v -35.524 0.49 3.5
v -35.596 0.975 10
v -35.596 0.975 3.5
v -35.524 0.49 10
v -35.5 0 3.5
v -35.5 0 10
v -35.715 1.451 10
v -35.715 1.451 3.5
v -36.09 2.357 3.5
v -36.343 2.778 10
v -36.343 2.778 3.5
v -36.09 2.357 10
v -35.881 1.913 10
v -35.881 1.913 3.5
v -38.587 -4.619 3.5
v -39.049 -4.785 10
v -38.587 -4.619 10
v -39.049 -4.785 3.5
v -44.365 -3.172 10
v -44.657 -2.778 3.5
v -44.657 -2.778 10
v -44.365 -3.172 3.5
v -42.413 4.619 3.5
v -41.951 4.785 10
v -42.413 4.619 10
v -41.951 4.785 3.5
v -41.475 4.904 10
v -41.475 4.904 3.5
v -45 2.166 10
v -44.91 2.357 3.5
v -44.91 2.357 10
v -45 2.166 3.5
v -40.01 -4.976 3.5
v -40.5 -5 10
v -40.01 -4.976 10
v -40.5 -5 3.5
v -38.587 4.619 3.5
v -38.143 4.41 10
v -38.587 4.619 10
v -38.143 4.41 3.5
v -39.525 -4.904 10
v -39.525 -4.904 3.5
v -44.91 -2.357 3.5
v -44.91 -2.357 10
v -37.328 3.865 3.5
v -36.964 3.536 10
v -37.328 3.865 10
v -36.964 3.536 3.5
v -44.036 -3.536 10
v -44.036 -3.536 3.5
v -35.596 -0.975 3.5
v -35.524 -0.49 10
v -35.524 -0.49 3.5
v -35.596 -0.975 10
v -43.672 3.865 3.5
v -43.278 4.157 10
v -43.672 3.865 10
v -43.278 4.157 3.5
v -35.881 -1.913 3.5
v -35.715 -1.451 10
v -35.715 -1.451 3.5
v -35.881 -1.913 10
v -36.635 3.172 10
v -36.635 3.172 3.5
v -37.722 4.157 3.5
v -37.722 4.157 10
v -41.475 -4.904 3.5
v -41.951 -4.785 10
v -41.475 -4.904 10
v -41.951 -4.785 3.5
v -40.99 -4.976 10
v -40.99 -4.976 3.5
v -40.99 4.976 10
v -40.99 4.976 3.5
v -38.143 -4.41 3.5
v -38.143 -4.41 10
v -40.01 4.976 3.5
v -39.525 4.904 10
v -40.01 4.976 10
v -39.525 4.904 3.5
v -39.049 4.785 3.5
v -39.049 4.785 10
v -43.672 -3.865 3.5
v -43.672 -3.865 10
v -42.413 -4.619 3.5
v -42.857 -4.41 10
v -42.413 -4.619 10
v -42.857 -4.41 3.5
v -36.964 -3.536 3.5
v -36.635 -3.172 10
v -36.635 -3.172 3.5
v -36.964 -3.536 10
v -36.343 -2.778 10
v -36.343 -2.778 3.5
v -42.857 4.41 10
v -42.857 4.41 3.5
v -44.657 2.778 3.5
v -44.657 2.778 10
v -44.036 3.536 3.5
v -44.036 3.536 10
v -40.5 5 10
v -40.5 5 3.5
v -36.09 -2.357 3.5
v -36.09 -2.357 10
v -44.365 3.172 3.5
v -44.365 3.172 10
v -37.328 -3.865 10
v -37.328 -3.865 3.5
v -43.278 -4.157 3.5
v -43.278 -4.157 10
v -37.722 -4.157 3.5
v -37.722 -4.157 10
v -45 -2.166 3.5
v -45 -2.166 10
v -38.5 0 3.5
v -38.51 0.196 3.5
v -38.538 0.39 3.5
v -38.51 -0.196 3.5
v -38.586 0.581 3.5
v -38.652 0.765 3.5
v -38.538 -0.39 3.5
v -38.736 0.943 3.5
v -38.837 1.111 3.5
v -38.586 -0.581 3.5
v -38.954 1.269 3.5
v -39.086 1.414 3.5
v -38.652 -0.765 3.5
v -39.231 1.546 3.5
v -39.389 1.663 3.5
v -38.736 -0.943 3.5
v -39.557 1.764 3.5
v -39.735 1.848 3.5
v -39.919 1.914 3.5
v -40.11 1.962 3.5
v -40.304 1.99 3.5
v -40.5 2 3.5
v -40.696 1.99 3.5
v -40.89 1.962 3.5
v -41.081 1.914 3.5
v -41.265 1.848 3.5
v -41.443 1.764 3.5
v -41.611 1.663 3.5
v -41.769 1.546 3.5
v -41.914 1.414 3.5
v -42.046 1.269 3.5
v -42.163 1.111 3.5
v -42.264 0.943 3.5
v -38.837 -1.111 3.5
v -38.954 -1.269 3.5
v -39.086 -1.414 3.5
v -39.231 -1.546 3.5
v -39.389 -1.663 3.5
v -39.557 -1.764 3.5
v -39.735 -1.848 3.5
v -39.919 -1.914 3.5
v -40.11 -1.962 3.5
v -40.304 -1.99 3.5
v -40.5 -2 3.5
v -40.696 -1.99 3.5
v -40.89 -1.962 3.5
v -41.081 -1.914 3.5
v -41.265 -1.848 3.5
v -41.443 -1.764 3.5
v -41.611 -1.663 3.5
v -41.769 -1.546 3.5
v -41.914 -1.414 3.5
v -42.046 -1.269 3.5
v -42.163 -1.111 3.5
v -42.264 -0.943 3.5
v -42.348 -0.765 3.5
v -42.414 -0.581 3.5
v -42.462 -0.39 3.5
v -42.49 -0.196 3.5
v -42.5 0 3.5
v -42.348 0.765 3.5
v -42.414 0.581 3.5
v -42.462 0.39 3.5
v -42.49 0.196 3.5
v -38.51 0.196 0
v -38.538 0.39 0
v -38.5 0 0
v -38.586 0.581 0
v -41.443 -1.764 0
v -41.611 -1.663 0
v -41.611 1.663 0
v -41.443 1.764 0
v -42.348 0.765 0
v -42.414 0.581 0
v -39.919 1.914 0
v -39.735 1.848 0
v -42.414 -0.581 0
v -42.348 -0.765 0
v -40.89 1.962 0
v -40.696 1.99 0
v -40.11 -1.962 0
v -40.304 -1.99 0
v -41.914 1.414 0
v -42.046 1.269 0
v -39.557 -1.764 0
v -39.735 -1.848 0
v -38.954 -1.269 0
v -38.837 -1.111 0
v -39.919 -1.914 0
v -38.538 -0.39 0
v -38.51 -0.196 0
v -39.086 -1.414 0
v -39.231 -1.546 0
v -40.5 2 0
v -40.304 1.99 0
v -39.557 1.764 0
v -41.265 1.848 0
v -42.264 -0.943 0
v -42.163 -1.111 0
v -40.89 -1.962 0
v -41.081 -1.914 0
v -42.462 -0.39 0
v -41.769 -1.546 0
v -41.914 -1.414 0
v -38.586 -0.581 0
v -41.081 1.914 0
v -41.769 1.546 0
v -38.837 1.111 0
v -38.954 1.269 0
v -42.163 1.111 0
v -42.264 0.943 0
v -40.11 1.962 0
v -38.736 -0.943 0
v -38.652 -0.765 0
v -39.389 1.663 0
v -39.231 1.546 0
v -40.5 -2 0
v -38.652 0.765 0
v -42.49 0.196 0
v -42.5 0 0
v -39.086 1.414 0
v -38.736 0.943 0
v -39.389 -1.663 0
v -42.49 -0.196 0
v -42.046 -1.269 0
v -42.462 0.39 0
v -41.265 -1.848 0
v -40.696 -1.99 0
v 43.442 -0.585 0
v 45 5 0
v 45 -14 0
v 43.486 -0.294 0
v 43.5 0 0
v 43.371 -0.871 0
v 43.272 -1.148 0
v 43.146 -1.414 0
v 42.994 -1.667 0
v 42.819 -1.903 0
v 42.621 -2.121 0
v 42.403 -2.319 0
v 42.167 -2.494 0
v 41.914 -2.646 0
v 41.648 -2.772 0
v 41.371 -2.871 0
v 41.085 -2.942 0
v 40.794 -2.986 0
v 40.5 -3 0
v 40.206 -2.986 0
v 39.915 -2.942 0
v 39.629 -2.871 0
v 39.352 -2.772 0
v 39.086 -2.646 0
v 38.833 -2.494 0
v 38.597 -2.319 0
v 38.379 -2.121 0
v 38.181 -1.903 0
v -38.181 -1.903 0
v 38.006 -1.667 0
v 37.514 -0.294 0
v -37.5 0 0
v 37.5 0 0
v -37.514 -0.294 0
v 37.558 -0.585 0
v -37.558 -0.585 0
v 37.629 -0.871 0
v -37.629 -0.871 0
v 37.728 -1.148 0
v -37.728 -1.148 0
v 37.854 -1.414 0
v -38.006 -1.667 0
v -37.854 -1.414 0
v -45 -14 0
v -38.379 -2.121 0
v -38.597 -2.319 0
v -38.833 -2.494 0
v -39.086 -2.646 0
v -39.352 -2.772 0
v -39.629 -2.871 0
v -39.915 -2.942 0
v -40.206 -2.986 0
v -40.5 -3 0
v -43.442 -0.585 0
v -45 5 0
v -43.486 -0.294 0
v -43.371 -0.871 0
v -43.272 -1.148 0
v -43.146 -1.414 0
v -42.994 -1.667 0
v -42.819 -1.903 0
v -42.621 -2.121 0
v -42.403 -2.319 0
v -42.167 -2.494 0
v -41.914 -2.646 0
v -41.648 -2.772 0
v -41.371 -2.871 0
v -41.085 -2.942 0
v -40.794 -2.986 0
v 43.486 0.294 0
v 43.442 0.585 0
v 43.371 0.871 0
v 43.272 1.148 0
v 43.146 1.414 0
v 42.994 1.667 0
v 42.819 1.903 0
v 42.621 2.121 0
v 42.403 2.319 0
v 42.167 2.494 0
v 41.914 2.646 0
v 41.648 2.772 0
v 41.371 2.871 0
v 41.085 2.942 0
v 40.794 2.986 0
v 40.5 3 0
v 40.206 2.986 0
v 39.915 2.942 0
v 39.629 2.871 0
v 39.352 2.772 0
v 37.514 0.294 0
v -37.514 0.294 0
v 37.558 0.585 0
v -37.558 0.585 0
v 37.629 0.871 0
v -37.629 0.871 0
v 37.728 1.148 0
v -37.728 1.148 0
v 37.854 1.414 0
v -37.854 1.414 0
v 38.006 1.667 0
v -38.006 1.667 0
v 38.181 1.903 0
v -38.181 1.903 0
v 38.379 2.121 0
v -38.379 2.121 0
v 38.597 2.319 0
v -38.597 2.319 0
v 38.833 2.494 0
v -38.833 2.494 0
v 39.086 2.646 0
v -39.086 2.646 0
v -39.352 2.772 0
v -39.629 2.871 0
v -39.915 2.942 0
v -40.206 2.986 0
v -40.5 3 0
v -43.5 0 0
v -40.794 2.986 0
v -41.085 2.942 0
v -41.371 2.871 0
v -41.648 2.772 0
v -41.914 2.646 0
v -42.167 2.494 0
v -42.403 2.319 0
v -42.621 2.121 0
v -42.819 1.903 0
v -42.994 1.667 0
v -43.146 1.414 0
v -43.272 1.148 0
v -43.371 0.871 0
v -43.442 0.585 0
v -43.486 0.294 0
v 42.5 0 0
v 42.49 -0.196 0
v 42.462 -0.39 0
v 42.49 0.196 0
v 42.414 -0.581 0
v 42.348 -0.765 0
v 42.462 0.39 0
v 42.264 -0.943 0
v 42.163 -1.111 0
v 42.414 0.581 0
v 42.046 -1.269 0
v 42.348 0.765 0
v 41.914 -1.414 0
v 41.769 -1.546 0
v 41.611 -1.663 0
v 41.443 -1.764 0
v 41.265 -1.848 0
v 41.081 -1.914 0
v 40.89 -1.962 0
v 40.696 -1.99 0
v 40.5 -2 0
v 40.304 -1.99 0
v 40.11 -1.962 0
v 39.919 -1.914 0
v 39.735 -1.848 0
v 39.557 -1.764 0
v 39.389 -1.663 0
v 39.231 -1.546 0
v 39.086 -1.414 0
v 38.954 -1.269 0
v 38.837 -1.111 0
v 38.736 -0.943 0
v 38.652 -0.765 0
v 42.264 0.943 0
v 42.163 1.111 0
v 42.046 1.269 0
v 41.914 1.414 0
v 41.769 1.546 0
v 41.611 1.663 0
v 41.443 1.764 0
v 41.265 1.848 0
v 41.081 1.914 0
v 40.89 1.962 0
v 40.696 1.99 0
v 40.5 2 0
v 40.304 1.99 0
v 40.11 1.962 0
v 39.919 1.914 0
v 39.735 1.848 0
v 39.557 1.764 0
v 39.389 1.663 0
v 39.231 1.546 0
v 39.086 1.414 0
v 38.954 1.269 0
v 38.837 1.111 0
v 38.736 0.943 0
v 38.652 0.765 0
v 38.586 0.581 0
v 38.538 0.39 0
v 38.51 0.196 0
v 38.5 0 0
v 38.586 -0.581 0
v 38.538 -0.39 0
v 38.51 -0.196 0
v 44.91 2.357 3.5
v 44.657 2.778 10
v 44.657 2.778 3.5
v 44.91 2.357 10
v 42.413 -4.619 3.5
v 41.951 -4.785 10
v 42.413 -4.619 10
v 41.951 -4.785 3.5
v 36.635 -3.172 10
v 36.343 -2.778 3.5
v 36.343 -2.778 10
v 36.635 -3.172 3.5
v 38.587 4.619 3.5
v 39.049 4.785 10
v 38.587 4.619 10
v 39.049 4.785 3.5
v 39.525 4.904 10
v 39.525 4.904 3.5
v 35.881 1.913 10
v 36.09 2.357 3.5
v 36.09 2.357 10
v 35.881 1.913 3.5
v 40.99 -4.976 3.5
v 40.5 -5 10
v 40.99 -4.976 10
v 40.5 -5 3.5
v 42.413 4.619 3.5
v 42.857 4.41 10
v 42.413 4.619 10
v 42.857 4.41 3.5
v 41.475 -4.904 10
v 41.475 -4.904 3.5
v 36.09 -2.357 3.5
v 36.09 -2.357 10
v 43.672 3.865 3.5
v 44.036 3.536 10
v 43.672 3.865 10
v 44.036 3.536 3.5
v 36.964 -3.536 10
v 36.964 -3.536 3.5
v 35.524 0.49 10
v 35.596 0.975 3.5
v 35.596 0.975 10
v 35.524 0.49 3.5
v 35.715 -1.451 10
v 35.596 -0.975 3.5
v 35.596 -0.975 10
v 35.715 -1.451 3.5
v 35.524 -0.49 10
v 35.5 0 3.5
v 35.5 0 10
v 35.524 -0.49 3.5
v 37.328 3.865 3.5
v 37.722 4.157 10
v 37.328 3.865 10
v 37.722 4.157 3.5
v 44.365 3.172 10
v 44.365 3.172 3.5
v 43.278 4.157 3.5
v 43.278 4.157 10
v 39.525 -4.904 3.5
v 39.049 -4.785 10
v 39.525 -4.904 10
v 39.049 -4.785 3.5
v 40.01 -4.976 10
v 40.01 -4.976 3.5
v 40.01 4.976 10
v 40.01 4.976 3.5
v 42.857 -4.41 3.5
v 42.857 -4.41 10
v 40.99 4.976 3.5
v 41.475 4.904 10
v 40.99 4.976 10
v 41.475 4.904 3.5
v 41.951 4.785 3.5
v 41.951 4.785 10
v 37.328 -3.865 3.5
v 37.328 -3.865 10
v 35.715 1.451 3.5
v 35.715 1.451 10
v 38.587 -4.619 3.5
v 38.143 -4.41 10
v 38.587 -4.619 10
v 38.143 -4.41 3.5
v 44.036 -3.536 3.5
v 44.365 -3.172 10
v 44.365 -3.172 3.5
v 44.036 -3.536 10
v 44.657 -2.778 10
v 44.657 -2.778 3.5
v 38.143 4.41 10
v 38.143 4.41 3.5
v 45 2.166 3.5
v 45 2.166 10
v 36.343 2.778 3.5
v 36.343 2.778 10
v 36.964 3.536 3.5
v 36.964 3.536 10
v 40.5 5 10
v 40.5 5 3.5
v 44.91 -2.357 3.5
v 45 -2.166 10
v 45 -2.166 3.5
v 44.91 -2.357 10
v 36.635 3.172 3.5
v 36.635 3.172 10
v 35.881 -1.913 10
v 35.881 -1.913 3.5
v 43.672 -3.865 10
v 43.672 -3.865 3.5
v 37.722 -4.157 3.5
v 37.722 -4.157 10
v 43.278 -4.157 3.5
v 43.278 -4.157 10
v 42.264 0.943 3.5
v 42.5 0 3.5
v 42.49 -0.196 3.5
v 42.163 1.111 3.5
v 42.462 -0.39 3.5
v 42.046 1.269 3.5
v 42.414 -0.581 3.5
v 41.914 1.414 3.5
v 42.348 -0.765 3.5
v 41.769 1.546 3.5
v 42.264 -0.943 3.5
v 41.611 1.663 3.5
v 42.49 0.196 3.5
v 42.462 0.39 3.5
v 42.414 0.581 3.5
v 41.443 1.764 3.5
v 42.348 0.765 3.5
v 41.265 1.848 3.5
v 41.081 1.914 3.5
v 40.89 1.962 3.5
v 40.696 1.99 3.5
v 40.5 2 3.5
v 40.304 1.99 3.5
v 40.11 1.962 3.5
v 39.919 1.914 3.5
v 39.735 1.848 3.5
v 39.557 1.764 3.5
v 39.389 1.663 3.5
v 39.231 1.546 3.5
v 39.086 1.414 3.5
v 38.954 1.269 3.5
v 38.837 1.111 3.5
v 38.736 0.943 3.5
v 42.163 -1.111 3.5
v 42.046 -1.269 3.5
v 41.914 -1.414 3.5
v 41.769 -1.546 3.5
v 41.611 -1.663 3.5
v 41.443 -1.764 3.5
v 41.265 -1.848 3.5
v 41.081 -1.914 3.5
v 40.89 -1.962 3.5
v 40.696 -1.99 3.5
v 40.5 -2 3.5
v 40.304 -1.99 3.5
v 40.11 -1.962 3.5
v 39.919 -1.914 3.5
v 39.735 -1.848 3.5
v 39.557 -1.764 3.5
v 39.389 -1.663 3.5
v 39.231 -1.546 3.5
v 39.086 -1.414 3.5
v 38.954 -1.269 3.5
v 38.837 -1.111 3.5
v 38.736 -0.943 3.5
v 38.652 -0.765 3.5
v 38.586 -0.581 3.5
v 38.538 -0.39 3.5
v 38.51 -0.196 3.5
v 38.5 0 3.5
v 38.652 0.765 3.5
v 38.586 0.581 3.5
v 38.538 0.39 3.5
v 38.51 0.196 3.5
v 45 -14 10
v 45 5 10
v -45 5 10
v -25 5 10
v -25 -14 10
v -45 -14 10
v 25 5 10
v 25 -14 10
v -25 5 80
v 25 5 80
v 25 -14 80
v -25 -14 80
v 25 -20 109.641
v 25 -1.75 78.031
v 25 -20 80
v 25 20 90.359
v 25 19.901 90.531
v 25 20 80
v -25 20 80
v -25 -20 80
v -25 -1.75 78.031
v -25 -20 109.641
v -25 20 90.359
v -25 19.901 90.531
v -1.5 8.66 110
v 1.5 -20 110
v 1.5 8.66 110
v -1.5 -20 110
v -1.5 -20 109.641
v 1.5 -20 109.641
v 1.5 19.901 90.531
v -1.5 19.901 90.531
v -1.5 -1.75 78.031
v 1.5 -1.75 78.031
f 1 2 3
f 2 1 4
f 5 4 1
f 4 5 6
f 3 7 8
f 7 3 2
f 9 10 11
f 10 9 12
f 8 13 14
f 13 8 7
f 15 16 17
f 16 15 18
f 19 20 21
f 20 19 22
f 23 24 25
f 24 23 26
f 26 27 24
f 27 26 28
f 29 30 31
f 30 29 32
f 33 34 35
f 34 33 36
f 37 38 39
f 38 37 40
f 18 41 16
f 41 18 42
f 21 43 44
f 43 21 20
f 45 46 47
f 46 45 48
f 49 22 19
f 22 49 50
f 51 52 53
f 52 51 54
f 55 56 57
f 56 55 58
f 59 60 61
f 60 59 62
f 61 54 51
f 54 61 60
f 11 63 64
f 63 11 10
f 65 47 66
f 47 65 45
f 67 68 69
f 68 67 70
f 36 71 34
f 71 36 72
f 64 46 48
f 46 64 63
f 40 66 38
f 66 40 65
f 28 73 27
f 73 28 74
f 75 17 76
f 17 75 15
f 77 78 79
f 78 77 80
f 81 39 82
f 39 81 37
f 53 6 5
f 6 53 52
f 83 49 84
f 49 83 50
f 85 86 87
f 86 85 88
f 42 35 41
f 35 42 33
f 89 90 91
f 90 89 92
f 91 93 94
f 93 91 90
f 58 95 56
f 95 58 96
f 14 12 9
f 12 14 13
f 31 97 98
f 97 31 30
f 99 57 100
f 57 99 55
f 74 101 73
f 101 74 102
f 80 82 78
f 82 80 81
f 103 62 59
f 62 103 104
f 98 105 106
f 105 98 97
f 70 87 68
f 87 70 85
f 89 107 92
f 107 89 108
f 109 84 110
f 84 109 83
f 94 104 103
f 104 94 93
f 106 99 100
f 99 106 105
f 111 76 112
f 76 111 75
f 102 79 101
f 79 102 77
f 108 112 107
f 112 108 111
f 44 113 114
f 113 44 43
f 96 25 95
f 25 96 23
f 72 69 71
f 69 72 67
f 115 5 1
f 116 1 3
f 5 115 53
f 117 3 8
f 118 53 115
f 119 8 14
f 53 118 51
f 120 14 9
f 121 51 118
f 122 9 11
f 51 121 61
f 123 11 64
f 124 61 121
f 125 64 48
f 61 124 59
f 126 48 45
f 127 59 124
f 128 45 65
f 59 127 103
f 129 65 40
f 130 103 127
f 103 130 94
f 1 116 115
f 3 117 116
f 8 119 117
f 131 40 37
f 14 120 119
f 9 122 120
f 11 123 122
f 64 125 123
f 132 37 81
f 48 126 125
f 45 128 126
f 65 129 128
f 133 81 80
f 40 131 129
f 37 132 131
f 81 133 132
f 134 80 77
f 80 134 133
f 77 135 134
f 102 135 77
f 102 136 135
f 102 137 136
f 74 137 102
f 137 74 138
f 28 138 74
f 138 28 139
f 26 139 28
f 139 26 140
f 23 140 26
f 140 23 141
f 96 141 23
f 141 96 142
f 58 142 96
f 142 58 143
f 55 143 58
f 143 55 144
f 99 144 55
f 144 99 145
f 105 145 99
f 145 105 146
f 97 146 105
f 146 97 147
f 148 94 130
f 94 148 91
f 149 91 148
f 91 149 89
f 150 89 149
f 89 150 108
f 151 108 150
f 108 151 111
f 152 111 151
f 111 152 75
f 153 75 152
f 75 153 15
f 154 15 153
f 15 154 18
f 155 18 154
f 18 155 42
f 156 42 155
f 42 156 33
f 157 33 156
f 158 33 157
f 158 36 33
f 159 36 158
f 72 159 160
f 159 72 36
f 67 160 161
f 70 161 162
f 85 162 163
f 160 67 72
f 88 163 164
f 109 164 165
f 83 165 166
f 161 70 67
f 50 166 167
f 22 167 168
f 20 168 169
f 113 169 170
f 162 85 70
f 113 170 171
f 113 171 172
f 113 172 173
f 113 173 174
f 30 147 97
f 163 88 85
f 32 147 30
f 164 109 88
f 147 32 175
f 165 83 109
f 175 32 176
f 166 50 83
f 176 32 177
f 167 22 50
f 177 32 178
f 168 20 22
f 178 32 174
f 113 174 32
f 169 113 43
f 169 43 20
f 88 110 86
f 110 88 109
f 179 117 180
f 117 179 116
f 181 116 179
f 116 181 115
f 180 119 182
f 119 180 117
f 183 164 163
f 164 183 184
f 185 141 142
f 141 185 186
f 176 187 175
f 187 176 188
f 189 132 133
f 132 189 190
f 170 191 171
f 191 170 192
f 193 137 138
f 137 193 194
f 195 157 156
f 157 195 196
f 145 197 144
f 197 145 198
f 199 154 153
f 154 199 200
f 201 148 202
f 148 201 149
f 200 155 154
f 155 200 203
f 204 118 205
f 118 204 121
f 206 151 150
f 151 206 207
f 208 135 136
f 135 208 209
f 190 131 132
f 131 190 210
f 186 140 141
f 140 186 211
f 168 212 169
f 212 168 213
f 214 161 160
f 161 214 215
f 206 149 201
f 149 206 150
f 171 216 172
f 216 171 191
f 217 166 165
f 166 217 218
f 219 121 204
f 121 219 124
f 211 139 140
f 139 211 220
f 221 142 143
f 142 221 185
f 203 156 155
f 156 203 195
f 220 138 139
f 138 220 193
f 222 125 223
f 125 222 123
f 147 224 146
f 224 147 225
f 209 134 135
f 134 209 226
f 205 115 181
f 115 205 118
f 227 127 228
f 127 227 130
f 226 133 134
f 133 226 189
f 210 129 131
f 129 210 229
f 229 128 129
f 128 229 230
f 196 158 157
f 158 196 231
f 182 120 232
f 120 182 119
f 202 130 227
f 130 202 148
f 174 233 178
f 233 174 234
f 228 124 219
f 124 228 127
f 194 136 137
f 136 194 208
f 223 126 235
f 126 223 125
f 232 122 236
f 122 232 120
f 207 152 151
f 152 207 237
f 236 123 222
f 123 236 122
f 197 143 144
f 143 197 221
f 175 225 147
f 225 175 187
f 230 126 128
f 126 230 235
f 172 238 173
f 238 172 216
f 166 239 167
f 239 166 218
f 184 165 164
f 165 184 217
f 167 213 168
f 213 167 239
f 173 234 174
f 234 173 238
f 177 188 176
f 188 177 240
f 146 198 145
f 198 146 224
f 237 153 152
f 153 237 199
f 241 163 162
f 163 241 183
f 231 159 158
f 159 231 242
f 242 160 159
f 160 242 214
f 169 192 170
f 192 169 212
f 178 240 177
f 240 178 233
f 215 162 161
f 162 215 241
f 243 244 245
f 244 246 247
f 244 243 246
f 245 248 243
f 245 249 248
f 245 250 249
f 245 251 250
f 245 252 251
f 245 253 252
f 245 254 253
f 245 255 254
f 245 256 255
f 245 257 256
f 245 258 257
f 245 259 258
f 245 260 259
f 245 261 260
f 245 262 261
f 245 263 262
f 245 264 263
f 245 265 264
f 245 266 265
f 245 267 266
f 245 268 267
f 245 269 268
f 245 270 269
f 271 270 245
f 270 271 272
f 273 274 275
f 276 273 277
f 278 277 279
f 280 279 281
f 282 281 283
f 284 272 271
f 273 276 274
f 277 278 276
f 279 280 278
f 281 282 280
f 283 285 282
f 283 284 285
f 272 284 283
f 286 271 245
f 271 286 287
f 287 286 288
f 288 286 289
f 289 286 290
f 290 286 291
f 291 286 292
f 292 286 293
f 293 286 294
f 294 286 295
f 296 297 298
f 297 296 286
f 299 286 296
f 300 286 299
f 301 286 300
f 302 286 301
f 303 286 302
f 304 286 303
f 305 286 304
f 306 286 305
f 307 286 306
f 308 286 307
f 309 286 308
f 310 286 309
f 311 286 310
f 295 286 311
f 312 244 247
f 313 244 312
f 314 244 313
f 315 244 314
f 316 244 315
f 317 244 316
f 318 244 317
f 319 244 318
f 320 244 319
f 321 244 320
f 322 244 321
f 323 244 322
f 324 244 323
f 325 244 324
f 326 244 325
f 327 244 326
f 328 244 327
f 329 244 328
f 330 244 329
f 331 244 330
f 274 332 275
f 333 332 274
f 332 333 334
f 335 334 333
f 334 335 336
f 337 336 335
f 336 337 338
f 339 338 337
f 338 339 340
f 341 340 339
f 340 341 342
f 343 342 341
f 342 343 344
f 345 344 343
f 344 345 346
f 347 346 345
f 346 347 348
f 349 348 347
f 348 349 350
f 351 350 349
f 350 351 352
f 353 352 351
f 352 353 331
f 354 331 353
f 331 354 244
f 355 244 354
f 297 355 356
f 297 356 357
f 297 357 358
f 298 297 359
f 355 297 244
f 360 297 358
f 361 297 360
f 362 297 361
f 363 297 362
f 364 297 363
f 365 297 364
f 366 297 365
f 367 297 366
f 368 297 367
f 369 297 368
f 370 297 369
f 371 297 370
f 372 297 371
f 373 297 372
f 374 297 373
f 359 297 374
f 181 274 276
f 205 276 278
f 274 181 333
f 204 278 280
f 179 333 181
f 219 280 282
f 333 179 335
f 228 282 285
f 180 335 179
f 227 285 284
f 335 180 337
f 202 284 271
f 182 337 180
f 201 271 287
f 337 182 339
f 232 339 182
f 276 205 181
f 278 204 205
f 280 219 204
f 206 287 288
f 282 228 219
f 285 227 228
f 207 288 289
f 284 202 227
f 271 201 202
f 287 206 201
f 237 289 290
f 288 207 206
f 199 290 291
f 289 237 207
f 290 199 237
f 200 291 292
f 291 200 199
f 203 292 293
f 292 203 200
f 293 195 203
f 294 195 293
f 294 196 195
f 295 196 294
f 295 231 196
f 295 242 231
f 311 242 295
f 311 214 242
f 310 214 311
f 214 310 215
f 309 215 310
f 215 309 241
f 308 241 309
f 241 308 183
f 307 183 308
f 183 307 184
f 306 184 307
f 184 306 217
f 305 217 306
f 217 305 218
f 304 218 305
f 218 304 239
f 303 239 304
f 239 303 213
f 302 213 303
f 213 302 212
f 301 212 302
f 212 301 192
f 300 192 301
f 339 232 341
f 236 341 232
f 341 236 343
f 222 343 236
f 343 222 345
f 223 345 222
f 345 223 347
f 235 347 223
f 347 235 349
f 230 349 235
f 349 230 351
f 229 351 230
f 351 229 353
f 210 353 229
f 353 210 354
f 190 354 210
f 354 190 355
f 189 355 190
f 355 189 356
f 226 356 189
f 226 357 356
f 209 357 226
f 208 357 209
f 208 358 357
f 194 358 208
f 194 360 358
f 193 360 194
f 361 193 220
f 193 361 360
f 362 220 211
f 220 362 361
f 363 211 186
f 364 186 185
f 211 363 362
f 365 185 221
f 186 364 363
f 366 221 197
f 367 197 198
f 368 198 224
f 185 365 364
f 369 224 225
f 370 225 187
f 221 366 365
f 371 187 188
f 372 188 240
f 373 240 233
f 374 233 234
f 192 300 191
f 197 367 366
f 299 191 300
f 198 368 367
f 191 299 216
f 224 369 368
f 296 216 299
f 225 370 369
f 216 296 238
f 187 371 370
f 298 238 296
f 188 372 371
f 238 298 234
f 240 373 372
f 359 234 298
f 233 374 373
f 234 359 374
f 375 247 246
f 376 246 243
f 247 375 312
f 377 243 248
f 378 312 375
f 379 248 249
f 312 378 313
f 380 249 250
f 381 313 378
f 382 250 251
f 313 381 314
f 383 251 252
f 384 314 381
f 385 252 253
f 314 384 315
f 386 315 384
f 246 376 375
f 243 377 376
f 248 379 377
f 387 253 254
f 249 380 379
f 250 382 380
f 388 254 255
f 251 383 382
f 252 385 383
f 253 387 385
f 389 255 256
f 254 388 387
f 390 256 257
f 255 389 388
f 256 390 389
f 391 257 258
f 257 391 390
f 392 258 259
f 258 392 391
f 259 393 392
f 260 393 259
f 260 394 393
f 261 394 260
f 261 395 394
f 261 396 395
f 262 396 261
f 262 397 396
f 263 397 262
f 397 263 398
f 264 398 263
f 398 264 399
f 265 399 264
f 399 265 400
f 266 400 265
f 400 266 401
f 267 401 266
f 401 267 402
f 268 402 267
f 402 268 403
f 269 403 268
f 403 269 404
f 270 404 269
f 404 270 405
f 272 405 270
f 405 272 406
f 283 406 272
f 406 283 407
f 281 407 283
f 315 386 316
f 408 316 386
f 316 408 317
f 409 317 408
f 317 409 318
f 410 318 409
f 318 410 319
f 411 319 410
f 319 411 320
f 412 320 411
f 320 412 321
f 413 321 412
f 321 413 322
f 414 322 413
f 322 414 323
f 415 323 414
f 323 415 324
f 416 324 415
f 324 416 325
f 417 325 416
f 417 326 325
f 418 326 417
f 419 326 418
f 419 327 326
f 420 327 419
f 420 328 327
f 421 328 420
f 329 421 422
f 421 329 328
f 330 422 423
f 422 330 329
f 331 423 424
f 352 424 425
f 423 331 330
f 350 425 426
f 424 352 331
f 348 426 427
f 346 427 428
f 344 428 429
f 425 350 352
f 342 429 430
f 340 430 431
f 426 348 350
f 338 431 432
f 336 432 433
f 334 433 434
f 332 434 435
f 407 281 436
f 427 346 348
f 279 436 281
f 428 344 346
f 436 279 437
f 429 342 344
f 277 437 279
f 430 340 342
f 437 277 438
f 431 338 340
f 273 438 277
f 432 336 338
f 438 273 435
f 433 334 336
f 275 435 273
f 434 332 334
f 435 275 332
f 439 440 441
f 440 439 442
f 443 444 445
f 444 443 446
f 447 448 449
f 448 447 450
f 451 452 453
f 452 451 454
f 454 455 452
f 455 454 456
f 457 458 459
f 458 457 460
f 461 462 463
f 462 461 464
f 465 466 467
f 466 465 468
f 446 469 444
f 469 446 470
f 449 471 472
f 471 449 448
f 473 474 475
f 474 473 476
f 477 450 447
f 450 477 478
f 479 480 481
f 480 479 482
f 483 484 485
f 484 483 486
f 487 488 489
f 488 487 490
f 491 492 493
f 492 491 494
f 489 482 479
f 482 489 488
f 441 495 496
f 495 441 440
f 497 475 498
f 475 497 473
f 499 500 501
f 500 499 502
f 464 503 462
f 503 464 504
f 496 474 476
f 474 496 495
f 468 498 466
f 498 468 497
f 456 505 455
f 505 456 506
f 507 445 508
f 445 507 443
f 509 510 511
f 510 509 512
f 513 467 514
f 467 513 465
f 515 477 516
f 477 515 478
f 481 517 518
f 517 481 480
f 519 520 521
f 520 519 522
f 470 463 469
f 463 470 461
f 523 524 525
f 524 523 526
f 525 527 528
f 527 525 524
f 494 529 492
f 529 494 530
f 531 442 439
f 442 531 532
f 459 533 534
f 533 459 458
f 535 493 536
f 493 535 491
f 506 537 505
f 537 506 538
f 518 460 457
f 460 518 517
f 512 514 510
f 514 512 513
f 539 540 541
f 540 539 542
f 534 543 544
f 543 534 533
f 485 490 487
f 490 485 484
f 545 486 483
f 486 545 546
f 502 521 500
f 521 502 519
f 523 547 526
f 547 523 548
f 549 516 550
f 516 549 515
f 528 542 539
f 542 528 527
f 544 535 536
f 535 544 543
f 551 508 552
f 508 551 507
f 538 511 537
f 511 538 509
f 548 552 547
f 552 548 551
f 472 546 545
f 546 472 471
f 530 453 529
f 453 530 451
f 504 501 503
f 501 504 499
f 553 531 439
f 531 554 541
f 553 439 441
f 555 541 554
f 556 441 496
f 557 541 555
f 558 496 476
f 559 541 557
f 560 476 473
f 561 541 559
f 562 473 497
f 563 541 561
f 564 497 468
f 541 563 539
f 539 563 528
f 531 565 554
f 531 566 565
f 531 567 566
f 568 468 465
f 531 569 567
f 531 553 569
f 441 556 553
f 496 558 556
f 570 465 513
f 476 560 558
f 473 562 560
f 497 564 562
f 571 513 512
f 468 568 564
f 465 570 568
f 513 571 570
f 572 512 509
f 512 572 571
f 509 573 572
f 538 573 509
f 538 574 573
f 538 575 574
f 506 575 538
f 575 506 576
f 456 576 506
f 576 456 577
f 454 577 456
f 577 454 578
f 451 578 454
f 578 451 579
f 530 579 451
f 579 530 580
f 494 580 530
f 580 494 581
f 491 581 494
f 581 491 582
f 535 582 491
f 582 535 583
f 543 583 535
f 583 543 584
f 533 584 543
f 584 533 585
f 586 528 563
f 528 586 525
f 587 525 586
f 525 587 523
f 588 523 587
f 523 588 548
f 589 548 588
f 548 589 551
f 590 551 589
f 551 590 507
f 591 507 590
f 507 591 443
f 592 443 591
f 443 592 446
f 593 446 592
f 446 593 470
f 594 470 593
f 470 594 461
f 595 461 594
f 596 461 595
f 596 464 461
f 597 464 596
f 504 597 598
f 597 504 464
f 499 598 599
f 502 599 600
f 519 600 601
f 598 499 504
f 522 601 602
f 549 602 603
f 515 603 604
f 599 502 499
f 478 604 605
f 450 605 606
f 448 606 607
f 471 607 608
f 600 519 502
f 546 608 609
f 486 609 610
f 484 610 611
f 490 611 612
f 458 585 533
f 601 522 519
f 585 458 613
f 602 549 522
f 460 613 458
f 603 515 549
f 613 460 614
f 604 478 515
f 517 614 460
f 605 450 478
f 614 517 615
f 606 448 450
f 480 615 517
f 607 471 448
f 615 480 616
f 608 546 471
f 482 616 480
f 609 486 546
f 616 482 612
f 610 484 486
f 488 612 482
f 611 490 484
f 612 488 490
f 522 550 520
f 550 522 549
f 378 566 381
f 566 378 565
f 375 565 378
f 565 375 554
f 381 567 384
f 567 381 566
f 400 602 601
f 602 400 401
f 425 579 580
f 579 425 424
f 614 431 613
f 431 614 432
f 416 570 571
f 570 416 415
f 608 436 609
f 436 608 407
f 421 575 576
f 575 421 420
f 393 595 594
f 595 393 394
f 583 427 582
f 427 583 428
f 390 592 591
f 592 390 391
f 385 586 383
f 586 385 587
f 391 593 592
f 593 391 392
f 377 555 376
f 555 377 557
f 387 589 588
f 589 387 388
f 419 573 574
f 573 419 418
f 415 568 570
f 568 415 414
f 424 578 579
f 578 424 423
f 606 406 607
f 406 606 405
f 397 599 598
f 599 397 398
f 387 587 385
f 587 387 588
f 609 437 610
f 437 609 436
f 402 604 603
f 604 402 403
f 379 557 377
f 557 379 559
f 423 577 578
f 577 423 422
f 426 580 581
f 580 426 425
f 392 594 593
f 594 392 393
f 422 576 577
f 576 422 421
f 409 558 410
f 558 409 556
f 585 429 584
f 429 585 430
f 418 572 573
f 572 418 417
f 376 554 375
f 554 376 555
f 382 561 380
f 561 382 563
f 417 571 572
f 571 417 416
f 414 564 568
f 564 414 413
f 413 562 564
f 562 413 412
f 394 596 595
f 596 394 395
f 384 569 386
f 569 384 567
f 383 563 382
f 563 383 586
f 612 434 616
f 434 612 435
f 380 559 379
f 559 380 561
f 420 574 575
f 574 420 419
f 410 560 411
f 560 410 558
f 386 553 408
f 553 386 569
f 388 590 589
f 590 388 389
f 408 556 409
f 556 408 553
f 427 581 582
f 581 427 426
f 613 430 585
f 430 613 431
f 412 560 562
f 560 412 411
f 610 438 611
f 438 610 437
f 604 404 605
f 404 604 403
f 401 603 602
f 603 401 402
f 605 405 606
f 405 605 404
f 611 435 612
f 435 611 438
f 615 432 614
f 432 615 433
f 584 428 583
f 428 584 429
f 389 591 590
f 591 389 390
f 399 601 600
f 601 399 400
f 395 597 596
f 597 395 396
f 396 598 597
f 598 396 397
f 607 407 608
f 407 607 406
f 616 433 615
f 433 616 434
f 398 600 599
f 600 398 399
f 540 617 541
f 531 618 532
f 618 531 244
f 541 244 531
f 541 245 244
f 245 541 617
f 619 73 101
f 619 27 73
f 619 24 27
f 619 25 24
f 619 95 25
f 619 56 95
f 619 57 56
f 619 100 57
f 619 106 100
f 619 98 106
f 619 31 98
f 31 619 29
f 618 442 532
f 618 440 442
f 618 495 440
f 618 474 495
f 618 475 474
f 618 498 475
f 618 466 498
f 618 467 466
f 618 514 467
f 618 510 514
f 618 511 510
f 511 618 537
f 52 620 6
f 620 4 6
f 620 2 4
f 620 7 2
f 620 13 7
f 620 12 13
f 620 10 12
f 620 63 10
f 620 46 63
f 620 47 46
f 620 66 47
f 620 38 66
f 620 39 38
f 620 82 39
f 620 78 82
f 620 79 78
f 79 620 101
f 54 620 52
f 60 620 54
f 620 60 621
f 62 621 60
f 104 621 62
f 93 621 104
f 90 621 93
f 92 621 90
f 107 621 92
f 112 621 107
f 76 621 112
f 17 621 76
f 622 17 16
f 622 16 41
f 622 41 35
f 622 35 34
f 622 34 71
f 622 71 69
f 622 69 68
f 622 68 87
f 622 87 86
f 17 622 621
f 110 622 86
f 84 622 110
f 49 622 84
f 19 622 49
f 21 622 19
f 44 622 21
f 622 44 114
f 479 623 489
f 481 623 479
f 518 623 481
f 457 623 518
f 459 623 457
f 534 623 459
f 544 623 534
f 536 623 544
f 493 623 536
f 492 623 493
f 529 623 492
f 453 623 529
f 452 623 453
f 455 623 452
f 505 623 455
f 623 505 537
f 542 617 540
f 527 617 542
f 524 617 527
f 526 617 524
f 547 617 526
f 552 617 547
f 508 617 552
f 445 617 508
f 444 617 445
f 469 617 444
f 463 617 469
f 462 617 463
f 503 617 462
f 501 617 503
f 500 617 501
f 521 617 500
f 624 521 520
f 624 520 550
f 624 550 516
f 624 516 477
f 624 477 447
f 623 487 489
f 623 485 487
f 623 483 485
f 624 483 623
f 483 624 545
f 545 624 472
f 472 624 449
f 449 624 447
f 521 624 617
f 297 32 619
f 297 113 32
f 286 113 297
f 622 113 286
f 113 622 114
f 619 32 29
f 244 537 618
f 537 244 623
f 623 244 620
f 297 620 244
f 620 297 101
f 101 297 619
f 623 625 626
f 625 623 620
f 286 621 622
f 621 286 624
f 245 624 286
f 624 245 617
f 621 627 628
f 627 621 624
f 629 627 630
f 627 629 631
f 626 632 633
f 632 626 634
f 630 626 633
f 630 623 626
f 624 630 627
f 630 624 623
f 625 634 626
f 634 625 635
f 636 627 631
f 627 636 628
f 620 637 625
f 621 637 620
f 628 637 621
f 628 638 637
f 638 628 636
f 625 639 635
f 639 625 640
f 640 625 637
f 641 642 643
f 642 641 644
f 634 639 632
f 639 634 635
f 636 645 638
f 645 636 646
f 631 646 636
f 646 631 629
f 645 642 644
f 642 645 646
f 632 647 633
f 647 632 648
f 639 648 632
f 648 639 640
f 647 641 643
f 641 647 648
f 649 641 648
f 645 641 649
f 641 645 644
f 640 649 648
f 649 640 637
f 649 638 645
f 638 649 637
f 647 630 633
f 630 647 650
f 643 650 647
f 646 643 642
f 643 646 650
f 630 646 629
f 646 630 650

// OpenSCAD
// file: shared.scad
// Shared functions

// Ryan Crosby 2019

// Triangular prism
module prism(l, w, h){
       polyhedron(
               points=[[0,0,0], [l,0,0], [l,w,0], [0,w,0], [0,w,h], [l,w,h]],
               faces=[[0,1,2,3],[5,4,3,2],[0,4,5,1],[0,3,4],[5,2,1]]
               );
}

module cube_round(v, r = 3) {
    if(r <= 0) {
        cube(v);
    }
    else {
        w = v[0];
        l = v[1];
        h = v[2];
        hull() 
        {
            translate([r, r, 0]) cylinder(h, r, r);
            translate([w - r, r, 0]) cylinder(h, r, r);
            translate([r, l - r, 0]) cylinder(h, r, r);
            translate([w - r, l - r, 0]) cylinder(h, r, r);
        }
    }
}
// main file
// iMac G3 Radiator Mounts
// Ryan Crosby 2021
//
// All units are in mm
//
// Reference is looking at the iMac front on at the screen, as if using it.
//
// X is left to right from the left edge to the right edge
// Y is front to back, from the display to the rear
// Z is bottom to top, from the bottom of the computer to the top of the case

//
// Constants
//

// Pretty round things with bigger numbers
// 16 = Good for draft
// 64 = Good for export
$fn=64;

// Floating point errors can cause difference operations to leave really thin faces where there should be none.
// Add this to subtracted object dimensions where appropriate to prevent this.
SEM = 0.0000001;

//
// Imports
//

use <shared.scad>;

//
// Variables
//

// Space between rear bracket screw holes: 81mm
rear_bracket_screw_spacing = 81;

baseplate_post_height = 7.5;

rear_bracket_screws_pos = 
[
    [-rear_bracket_screw_spacing / 2, 0, 0],
    [rear_bracket_screw_spacing / 2, 0, 0]
];

// Dimensions of the main box "core" of the radiator
radiator_main_dim = [200, 200, 47];
// Dimensions of one of the two bottom caps that the inlets/outlets are fixed into.
radiator_bot_cap_dim = [95, 25, 40];
// The x distance between the two radiator bottom caps
radiator_bot_cap_gap = 3;

// Dimensions of the top cap that the fill port is fixed into.
radiator_top_cap_dim = [195, 14, 40];


//
// Modules
//

// Hole
module hole(r, h) {
    cylinder(h = h + 2 * SEM, r1 = r, r2 = r, center = true);
}

module baseplate_screwhole() {
    union() {
        // Top of screw mount
        translate([0, 0, 20 / 2 + 3])
        hole(4, 20);
        
        // Screw thread cutout
        hole(2, 40);
        
        // Post
        translate([0, 0, -10])
        hole(3, 20); // post diameter is 5mm, so this has 1mm tolerence in diameter
    }
}

module larger_screwhole() {
    union() {
        // Top of screw cutout
        translate([0, 0, 20 / 2 + 3.5])
        hole(5, 20);
        
        // Screw thread cutout
        hole(2, 40);
        
        // Post cutout
        translate([0, 0, -10])
        hole(3, 20); // post diameter is 5mm, so this has 1mm tolerence in diameter
    }
}

module larger_screwhole_access() {
    hull() {
        translate([0, 0, 20 / 2 + 3.5])
        hole(5, 20);
        
        translate([15, 0, 50 / 2 + 3.5])
        hole(5, 50);
    }
}

//
// Parts
//

module radiator() {
        module bot_cap() {
            translate([0, -radiator_main_dim[1] / 2, 0])
            translate(-radiator_bot_cap_dim / 2 - [0, radiator_bot_cap_dim[1] / 2, 0])
            cube(radiator_bot_cap_dim);
        }

        union() {
            translate(-radiator_main_dim / 2)
            cube(radiator_main_dim);

            translate([-radiator_bot_cap_dim[0] / 2 - radiator_bot_cap_gap / 2, 0, 0])
            bot_cap();
            translate([radiator_bot_cap_dim[0] / 2 + radiator_bot_cap_gap / 2, 0, 0])
            bot_cap();

            translate([0, radiator_main_dim[1] / 2, 0])
            translate(-radiator_top_cap_dim / 2 + [0, radiator_top_cap_dim[1] / 2, 0])
            cube(radiator_top_cap_dim);
        }

}
 
module mount() {
    union() {
        translate([-50 / 2, -19 + 5, 0])
        cube([50, 19, 80]);

        translate([-50 / 2, -20, 80])
        cube([50, 40, 30]);

        difference() {
            translate([-90 / 2, -19 + 5, 0])
            cube([90, 19, 10]);

            translate(rear_bracket_screws_pos[0])
            #larger_screwhole();

            translate(rear_bracket_screws_pos[1])
            #larger_screwhole();
        }
    }
}

difference() {
    mount();

    #translate([0, 0, 75])
    rotate([30, 0, 0])
    translate([0, radiator_main_dim[1] / 2 + radiator_bot_cap_dim[1], radiator_main_dim[2] / 2])
    radiator();
}
